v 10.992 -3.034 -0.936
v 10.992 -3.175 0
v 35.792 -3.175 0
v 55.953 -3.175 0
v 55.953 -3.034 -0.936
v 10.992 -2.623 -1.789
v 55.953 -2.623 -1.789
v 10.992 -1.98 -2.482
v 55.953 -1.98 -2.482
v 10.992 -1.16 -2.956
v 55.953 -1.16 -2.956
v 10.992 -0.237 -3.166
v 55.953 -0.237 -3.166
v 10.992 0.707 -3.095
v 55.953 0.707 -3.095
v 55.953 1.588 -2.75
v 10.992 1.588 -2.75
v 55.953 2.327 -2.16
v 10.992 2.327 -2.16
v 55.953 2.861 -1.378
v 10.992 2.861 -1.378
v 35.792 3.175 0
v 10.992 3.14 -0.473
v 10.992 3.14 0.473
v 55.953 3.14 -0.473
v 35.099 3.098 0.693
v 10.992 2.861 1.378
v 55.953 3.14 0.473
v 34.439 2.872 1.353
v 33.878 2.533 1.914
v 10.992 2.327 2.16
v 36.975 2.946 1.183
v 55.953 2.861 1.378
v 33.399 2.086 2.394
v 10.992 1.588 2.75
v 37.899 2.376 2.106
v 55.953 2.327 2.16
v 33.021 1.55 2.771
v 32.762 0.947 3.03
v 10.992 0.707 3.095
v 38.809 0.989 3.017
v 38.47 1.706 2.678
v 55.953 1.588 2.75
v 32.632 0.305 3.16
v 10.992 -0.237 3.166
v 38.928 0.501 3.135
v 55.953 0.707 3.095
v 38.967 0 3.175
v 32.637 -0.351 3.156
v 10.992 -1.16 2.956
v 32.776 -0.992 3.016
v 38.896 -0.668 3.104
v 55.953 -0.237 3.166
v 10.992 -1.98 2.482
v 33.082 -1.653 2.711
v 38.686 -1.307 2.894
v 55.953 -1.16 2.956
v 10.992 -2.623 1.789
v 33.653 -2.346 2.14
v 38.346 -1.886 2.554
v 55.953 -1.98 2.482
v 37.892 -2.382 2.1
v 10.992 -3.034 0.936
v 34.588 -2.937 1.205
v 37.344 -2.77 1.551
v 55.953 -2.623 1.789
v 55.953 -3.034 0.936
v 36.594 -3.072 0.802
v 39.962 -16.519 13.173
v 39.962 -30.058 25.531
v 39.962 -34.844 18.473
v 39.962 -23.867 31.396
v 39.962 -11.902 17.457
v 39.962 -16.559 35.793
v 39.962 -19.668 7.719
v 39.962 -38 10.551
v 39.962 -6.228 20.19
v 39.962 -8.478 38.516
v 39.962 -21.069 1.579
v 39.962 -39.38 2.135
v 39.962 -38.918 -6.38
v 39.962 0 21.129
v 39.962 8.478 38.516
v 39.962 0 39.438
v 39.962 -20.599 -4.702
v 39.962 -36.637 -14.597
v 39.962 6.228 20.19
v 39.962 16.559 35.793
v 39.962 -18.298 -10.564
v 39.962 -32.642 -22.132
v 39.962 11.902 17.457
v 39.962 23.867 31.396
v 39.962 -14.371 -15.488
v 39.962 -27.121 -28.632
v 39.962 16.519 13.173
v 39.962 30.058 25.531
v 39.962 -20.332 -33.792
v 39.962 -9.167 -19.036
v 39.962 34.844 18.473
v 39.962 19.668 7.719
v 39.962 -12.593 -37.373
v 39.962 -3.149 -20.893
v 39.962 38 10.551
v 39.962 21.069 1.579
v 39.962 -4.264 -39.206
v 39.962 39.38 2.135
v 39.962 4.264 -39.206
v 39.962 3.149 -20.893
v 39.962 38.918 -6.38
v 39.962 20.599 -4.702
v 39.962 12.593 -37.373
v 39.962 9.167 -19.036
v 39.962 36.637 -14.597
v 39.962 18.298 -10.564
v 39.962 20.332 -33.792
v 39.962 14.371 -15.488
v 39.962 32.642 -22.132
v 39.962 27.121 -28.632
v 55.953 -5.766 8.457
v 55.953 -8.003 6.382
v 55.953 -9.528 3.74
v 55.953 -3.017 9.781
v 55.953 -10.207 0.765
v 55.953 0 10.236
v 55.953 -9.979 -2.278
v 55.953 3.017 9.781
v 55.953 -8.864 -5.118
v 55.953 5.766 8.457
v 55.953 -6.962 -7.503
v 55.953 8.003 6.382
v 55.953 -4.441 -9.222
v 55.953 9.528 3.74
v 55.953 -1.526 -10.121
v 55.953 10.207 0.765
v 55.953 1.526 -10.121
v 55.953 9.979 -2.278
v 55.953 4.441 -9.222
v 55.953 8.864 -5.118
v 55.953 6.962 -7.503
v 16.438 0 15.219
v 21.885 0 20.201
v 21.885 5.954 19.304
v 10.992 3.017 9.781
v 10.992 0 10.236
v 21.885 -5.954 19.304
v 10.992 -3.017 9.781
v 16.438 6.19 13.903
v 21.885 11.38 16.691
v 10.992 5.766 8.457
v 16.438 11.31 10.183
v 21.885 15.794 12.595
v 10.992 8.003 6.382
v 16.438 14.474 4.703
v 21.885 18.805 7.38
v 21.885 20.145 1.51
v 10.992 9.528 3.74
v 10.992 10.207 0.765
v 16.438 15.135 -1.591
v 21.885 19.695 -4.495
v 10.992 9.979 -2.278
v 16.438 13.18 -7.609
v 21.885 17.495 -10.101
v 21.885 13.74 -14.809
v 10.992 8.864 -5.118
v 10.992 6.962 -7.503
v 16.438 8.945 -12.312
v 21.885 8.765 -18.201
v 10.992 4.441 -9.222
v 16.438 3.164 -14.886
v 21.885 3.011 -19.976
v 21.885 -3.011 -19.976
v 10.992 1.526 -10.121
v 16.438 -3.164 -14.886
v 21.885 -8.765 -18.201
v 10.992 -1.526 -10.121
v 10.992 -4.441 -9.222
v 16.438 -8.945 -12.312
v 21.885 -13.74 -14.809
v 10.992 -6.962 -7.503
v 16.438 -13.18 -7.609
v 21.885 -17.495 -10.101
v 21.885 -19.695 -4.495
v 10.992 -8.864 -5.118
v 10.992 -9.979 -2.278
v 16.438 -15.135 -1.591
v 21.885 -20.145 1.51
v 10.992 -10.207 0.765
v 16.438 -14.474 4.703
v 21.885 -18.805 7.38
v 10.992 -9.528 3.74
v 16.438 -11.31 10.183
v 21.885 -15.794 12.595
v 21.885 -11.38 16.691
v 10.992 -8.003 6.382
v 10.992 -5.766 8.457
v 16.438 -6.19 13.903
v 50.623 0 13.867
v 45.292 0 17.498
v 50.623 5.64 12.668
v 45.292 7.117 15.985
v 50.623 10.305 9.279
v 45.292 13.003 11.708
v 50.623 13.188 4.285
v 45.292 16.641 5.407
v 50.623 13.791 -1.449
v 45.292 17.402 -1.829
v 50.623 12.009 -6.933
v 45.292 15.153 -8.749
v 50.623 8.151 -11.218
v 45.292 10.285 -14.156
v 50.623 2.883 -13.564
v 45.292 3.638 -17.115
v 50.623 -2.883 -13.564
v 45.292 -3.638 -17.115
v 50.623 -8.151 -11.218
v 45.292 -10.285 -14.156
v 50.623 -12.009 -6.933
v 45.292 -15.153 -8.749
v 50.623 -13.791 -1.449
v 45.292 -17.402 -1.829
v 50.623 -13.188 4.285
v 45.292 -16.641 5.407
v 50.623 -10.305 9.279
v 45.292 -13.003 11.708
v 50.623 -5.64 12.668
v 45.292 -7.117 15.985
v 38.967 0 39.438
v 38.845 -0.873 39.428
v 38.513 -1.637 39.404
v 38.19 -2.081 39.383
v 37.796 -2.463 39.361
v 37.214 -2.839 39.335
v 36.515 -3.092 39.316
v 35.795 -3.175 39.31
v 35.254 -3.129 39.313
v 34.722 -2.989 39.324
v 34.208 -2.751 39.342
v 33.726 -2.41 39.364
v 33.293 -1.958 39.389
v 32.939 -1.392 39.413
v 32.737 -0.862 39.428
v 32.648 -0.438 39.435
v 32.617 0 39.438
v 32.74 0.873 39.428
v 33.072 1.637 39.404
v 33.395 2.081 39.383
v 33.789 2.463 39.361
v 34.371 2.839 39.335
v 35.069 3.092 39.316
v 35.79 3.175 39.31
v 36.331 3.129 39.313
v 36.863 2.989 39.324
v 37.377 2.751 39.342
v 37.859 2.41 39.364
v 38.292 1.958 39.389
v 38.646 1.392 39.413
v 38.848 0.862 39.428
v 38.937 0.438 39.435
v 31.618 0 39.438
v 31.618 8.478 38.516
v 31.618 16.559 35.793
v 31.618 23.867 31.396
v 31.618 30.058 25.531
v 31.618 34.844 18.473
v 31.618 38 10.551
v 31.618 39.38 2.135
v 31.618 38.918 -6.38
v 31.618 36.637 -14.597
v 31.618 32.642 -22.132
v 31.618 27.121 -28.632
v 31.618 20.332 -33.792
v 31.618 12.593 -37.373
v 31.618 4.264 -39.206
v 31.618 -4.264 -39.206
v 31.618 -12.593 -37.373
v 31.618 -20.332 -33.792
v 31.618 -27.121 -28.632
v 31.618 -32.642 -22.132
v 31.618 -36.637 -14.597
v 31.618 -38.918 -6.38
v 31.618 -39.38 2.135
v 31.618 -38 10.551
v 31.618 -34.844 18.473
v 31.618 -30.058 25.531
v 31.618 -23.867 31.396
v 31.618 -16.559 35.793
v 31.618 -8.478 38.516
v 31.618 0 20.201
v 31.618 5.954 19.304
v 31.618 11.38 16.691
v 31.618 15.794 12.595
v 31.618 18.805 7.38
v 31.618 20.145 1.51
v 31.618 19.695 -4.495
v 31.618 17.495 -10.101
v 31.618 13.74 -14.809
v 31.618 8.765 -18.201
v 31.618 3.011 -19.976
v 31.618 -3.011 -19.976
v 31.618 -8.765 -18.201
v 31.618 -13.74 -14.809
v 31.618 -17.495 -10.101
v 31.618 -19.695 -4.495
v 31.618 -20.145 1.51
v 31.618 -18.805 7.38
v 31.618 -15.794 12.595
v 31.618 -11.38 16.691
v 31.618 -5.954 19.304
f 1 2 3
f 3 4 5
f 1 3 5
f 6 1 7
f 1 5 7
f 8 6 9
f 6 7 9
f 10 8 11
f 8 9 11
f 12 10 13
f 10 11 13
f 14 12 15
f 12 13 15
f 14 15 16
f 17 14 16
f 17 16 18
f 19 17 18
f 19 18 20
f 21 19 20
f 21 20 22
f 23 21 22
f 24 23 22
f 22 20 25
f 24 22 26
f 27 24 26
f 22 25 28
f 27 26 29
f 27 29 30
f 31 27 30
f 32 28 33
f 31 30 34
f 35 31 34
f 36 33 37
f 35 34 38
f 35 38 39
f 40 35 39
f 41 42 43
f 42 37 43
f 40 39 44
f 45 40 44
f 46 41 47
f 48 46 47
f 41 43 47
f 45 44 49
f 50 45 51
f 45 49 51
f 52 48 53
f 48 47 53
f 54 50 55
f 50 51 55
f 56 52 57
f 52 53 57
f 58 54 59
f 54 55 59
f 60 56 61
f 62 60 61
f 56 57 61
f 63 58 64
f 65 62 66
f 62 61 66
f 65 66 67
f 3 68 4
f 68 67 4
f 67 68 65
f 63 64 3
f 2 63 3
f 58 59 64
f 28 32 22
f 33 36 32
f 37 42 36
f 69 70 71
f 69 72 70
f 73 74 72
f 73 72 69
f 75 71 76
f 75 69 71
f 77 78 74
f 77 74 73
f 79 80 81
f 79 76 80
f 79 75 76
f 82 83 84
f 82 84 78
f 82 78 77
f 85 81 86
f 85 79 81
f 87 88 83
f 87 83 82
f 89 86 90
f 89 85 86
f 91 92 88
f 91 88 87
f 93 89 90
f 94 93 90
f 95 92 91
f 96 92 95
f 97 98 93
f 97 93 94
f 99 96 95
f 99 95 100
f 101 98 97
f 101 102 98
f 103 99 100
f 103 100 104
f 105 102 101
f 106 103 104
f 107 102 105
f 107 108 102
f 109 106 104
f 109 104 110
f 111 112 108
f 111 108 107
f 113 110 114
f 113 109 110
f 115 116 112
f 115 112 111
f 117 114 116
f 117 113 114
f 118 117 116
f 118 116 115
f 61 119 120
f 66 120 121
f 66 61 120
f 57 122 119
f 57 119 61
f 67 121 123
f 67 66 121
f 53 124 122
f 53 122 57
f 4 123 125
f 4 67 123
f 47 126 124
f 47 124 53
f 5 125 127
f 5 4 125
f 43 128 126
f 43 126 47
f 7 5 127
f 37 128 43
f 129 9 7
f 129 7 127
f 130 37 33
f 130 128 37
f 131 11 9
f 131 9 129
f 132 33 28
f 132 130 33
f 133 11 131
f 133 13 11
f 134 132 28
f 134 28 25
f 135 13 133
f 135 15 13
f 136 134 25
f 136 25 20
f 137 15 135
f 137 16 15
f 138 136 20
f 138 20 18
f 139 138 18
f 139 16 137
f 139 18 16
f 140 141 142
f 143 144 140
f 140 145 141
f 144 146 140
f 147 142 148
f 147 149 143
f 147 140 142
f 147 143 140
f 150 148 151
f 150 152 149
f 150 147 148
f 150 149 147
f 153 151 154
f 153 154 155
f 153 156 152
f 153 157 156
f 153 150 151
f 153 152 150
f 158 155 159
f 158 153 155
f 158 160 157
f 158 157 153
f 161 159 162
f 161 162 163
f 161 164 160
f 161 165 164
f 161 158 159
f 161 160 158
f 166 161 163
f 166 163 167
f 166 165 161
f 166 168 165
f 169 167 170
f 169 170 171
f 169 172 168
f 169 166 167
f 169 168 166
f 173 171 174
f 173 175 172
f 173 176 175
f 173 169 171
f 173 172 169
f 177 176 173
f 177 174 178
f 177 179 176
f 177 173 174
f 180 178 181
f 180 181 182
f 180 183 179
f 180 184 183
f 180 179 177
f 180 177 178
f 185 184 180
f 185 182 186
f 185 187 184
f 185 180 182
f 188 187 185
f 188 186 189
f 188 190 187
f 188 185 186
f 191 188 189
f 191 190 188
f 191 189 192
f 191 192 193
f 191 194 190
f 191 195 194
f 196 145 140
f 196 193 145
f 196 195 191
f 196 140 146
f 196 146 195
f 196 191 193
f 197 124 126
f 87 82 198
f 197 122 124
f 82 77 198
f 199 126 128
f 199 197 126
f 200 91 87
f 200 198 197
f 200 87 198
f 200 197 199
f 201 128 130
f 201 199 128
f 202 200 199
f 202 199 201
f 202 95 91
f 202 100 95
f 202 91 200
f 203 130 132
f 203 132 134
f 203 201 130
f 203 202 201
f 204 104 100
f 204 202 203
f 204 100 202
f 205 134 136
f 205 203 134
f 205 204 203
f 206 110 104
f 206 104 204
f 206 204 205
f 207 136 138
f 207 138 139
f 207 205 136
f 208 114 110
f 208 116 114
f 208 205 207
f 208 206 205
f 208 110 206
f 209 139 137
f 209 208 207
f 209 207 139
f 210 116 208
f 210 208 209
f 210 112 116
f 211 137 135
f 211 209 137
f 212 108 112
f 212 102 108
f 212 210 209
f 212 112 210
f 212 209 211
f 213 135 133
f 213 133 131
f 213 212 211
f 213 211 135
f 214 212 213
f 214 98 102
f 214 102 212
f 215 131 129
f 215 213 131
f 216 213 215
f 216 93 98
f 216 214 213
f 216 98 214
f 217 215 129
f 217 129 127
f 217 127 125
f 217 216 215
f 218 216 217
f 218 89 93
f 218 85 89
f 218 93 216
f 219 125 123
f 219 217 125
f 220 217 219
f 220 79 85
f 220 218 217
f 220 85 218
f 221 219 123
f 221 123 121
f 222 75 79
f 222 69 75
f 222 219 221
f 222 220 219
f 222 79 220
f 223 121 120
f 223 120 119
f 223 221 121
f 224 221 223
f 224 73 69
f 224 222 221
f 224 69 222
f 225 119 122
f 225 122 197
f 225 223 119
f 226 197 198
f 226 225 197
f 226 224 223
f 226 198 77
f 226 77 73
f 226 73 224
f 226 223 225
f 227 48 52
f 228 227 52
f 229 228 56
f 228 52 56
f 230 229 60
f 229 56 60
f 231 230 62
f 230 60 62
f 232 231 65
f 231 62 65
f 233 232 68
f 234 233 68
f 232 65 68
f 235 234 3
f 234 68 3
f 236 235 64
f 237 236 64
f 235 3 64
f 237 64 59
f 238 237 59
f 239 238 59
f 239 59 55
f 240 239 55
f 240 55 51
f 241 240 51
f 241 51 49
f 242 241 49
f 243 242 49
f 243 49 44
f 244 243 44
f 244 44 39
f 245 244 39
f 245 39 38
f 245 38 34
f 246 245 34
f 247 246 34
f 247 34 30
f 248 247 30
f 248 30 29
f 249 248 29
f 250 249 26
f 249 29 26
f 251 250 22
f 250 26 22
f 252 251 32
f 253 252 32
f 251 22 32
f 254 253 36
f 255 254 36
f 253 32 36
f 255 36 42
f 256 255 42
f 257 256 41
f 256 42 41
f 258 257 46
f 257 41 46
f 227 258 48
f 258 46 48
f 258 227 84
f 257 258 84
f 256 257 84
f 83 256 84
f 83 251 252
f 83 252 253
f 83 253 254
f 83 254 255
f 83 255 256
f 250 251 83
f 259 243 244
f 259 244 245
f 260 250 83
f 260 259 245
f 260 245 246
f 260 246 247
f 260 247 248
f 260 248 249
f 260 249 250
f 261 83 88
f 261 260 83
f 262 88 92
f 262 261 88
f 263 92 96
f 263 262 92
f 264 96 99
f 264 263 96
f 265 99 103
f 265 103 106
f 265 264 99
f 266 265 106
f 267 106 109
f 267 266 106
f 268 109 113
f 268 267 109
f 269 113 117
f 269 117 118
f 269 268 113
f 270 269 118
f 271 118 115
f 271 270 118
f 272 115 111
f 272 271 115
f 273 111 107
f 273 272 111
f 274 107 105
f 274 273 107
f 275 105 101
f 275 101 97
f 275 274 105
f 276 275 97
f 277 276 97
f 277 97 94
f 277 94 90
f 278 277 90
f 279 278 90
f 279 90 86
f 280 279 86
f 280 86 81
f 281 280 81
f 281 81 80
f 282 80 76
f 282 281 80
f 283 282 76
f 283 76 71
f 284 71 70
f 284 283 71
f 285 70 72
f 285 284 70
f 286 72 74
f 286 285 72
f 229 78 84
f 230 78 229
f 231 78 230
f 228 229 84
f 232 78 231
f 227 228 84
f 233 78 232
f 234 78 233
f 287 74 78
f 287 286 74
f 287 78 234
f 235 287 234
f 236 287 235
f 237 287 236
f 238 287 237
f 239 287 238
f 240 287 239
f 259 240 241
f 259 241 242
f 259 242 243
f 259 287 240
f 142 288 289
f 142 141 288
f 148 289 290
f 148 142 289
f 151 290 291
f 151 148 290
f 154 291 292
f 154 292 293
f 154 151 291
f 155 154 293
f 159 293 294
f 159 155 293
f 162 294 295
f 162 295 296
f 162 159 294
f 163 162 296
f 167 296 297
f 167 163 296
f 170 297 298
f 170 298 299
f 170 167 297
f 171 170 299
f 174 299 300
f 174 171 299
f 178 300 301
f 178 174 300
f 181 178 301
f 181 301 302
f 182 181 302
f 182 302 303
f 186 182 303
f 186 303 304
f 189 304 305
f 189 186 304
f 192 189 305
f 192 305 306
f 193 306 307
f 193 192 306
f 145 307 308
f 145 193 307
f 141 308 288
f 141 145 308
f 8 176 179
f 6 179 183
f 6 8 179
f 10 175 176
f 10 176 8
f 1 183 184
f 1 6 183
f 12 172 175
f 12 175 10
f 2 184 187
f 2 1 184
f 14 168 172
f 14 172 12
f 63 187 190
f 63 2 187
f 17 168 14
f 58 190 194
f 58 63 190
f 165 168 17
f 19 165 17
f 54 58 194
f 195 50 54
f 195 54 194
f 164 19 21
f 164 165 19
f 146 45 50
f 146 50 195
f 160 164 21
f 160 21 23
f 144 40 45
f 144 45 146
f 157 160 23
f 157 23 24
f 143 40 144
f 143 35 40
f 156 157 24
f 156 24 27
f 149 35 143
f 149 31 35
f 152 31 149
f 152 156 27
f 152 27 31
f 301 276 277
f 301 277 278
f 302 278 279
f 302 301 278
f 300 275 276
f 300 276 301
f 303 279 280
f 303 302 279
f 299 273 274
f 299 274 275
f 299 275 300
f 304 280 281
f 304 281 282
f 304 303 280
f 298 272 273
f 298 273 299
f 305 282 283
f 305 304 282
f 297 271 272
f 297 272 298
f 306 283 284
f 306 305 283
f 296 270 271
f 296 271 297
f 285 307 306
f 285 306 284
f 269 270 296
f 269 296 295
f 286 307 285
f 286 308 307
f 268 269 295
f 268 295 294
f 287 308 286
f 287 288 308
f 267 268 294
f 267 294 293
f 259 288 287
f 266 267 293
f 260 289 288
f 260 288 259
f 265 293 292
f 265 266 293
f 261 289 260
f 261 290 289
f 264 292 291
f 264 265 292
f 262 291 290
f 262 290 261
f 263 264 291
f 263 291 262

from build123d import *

# Parameters (mm, degrees)
F4_D     = 6.35
F4_DEPTH = 39.4386441836
F5_D     = 6.35


with BuildPart() as f1:
    # F0 (on Front) → F1 (revolve)
    with BuildSketch(Plane.XZ):
        Polygon((10.9917372465, 10.2357640862), (10.9917372465, 0), (55.9533685446, 0), (55.9533685446, 10.2357640862), (39.9618595839, 21.1285278201), (39.9618595839, 39.4376441836), (31.6184610128, 39.4376441836), (31.6184610128, 20.2014818788), (21.8845009804, 20.2014818788), align=None)
    revolve(axis=Axis((33.4725528955, 0, 0), (-1, 0, 0)))

    # F4 (through all, one way)
    with BuildSketch(Plane(origin=(0, 0, 0), x_dir=(1, 0, 0), z_dir=(0, 0, -1))):
        with Locations((35.7924923301, 0)):
            Circle(F4_D / 2)
    extrude(amount=-F4_DEPTH, mode=Mode.SUBTRACT)

    # F5 (through all)
    with Locations(Plane(origin=(0, 0, 0), x_dir=(0, 1, 0), z_dir=(-1, 0, 0))):
        with Locations((0, 0)):
            Hole(F5_D / 2)


solid = f1.part
